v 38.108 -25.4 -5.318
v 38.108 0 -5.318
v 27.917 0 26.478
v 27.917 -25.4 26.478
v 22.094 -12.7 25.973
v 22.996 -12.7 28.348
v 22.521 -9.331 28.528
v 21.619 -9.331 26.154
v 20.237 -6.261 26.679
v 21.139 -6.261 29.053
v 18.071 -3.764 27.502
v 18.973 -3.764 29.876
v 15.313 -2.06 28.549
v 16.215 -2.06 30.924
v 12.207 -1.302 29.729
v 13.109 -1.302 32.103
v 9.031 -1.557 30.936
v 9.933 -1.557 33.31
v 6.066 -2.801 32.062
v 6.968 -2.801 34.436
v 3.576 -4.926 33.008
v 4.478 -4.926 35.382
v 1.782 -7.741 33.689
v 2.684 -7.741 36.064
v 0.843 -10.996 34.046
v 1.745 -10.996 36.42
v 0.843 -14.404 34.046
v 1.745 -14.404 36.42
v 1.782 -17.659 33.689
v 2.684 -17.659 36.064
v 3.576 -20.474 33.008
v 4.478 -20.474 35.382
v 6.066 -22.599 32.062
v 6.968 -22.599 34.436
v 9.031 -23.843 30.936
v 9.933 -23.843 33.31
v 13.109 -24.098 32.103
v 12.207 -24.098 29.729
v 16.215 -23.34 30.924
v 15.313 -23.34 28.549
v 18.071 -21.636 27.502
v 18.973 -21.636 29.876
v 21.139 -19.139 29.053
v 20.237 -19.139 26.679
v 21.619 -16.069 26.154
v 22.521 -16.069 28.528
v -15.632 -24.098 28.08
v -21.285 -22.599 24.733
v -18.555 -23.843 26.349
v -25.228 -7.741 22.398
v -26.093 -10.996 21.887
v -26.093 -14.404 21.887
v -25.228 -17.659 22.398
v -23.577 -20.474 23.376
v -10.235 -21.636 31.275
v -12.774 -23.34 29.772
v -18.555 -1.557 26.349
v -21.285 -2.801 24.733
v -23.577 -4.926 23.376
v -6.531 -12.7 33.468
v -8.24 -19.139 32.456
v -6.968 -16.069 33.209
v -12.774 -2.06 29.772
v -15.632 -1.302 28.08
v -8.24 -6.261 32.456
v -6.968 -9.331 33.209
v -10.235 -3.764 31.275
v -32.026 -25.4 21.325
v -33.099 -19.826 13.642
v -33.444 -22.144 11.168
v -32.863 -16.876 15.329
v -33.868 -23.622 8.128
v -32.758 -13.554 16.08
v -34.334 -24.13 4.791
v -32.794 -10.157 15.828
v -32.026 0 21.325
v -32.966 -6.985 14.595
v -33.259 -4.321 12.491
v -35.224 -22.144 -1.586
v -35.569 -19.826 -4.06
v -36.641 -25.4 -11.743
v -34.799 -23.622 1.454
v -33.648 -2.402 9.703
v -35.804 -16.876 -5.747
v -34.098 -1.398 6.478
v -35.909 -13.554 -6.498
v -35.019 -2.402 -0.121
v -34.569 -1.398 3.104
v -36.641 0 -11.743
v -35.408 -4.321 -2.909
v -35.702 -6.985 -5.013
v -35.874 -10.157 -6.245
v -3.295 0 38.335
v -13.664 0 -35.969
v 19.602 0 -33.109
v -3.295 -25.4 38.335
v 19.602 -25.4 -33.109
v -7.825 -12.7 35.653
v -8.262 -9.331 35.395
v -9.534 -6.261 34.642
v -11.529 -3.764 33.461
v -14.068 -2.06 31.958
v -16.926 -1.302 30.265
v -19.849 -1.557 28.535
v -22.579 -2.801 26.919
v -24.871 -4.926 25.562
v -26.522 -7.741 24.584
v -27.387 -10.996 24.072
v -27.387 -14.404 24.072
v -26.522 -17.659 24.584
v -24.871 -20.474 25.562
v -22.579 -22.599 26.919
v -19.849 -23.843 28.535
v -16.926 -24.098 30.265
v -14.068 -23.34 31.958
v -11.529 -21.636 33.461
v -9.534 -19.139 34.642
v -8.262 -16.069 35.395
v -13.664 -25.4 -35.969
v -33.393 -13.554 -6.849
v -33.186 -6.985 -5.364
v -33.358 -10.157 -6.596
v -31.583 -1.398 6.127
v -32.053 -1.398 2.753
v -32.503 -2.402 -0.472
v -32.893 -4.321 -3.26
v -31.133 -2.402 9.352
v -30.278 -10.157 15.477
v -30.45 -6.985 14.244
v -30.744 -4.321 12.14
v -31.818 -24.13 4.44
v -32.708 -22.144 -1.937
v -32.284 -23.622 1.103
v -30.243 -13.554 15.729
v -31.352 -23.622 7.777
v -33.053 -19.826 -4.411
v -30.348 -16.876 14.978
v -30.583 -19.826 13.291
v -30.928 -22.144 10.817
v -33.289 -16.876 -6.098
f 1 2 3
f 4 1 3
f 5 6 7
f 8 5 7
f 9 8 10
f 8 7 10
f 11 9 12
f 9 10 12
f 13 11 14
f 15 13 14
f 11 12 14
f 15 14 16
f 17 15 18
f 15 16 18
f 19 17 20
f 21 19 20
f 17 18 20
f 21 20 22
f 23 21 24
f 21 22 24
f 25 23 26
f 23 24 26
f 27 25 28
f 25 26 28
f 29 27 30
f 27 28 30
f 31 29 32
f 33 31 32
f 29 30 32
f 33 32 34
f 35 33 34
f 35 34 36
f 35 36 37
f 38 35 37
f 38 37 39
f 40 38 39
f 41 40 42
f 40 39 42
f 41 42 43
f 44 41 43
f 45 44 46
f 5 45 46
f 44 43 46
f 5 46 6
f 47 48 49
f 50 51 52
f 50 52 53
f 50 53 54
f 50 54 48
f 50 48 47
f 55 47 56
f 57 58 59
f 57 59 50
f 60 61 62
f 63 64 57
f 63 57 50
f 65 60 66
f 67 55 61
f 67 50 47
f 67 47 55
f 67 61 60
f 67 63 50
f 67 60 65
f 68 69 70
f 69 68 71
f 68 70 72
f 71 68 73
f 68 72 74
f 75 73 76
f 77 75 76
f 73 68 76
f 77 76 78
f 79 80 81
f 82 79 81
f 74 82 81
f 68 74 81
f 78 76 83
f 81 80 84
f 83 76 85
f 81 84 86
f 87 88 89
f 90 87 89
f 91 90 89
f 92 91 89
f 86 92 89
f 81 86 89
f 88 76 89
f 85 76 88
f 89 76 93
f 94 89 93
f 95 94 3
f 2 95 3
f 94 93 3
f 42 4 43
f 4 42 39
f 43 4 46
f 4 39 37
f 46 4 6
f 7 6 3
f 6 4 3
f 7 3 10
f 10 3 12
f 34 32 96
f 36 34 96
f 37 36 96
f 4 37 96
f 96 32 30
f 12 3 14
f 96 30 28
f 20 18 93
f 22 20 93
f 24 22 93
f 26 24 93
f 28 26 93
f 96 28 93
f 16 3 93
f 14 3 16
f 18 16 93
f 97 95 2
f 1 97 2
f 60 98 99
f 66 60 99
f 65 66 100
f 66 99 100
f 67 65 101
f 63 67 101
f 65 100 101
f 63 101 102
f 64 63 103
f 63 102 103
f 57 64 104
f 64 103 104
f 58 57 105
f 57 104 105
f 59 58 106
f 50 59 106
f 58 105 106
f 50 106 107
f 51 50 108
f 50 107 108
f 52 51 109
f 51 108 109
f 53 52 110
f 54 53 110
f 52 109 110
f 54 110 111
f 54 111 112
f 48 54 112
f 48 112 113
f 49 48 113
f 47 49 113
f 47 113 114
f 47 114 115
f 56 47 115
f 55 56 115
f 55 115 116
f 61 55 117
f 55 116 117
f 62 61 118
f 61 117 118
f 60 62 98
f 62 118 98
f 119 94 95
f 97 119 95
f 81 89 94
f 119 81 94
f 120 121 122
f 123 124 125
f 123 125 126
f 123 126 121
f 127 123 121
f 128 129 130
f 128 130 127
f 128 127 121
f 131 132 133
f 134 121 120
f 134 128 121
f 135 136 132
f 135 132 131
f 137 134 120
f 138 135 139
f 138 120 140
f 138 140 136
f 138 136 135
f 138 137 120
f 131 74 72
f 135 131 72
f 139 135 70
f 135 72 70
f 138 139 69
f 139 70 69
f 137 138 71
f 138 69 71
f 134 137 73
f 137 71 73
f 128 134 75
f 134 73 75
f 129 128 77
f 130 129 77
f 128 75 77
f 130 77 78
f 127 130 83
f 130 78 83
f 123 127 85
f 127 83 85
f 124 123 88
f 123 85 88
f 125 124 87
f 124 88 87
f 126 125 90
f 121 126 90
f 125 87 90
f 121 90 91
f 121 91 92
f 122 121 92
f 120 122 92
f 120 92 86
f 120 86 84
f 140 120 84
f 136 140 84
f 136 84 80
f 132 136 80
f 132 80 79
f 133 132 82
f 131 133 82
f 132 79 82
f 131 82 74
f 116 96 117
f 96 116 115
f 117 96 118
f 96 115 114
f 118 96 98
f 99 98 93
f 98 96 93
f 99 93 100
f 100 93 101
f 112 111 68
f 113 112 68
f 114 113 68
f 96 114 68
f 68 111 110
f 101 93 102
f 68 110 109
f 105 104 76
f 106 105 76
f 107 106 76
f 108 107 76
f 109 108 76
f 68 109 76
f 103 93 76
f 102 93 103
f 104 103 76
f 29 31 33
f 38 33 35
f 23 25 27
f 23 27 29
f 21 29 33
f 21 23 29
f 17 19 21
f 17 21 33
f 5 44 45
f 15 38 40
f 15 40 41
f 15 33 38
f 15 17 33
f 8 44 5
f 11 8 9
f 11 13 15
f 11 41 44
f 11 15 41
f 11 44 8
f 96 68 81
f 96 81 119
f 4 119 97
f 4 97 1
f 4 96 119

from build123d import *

# Parameters (mm, degrees)
F1_DEPTH = 25.4
F2_R     = 11.43
F5_DEPTH = 2.54
F3_R     = 11.43
F6_DEPTH = 2.54
F4_R     = 11.43
F7_DEPTH = 2.54


with BuildPart() as f1:
    # F0 (on Front) → F1 (new body)
    with BuildSketch(Plane.XZ):
        Polygon((38.1075000086, -5.3176727306), (27.9171615839, 26.4781285077), (-3.2953689198, 38.3353589243), (-32.0264194136, 21.3252821721), (-36.6409228691, -11.7431670122), (-13.6640640655, -35.9687719194), (19.6021136755, -33.109157942), align=None)
    extrude(amount=F1_DEPTH)

    # F2 (on face) → F5 (cut)
    with BuildSketch(Plane(origin=(-34.3336711413, 0, 4.7910575799), x_dir=(0, -1, 0), z_dir=(-0.9904036604, 0, 0.1382048819))):
        with Locations((12.7, 0)):
            Circle(F2_R)
    extrude(amount=-F5_DEPTH, mode=Mode.SUBTRACT)

    # F3 (on face) → F6 (cut)
    with BuildSketch(Plane(origin=(-17.6608941667, 0, 29.8303205482), x_dir=(0.8604980965, 0, 0.5094536543), z_dir=(-0.5094536543, 0, 0.8604980965))):
        with Locations((0, -12.7)):
            Circle(F3_R)
    extrude(amount=-F6_DEPTH, mode=Mode.SUBTRACT)

    # F4 (on face) → F7 (cut)
    with BuildSketch(Plane(origin=(12.3108963321, 0, 32.406743716), x_dir=(0.9348186935, 0, -0.3551253445), z_dir=(0.3551253445, 0, 0.9348186935))):
        with Locations((0, -12.7)):
            Circle(F4_R)
    extrude(amount=-F7_DEPTH, mode=Mode.SUBTRACT)


solid = f1.part
